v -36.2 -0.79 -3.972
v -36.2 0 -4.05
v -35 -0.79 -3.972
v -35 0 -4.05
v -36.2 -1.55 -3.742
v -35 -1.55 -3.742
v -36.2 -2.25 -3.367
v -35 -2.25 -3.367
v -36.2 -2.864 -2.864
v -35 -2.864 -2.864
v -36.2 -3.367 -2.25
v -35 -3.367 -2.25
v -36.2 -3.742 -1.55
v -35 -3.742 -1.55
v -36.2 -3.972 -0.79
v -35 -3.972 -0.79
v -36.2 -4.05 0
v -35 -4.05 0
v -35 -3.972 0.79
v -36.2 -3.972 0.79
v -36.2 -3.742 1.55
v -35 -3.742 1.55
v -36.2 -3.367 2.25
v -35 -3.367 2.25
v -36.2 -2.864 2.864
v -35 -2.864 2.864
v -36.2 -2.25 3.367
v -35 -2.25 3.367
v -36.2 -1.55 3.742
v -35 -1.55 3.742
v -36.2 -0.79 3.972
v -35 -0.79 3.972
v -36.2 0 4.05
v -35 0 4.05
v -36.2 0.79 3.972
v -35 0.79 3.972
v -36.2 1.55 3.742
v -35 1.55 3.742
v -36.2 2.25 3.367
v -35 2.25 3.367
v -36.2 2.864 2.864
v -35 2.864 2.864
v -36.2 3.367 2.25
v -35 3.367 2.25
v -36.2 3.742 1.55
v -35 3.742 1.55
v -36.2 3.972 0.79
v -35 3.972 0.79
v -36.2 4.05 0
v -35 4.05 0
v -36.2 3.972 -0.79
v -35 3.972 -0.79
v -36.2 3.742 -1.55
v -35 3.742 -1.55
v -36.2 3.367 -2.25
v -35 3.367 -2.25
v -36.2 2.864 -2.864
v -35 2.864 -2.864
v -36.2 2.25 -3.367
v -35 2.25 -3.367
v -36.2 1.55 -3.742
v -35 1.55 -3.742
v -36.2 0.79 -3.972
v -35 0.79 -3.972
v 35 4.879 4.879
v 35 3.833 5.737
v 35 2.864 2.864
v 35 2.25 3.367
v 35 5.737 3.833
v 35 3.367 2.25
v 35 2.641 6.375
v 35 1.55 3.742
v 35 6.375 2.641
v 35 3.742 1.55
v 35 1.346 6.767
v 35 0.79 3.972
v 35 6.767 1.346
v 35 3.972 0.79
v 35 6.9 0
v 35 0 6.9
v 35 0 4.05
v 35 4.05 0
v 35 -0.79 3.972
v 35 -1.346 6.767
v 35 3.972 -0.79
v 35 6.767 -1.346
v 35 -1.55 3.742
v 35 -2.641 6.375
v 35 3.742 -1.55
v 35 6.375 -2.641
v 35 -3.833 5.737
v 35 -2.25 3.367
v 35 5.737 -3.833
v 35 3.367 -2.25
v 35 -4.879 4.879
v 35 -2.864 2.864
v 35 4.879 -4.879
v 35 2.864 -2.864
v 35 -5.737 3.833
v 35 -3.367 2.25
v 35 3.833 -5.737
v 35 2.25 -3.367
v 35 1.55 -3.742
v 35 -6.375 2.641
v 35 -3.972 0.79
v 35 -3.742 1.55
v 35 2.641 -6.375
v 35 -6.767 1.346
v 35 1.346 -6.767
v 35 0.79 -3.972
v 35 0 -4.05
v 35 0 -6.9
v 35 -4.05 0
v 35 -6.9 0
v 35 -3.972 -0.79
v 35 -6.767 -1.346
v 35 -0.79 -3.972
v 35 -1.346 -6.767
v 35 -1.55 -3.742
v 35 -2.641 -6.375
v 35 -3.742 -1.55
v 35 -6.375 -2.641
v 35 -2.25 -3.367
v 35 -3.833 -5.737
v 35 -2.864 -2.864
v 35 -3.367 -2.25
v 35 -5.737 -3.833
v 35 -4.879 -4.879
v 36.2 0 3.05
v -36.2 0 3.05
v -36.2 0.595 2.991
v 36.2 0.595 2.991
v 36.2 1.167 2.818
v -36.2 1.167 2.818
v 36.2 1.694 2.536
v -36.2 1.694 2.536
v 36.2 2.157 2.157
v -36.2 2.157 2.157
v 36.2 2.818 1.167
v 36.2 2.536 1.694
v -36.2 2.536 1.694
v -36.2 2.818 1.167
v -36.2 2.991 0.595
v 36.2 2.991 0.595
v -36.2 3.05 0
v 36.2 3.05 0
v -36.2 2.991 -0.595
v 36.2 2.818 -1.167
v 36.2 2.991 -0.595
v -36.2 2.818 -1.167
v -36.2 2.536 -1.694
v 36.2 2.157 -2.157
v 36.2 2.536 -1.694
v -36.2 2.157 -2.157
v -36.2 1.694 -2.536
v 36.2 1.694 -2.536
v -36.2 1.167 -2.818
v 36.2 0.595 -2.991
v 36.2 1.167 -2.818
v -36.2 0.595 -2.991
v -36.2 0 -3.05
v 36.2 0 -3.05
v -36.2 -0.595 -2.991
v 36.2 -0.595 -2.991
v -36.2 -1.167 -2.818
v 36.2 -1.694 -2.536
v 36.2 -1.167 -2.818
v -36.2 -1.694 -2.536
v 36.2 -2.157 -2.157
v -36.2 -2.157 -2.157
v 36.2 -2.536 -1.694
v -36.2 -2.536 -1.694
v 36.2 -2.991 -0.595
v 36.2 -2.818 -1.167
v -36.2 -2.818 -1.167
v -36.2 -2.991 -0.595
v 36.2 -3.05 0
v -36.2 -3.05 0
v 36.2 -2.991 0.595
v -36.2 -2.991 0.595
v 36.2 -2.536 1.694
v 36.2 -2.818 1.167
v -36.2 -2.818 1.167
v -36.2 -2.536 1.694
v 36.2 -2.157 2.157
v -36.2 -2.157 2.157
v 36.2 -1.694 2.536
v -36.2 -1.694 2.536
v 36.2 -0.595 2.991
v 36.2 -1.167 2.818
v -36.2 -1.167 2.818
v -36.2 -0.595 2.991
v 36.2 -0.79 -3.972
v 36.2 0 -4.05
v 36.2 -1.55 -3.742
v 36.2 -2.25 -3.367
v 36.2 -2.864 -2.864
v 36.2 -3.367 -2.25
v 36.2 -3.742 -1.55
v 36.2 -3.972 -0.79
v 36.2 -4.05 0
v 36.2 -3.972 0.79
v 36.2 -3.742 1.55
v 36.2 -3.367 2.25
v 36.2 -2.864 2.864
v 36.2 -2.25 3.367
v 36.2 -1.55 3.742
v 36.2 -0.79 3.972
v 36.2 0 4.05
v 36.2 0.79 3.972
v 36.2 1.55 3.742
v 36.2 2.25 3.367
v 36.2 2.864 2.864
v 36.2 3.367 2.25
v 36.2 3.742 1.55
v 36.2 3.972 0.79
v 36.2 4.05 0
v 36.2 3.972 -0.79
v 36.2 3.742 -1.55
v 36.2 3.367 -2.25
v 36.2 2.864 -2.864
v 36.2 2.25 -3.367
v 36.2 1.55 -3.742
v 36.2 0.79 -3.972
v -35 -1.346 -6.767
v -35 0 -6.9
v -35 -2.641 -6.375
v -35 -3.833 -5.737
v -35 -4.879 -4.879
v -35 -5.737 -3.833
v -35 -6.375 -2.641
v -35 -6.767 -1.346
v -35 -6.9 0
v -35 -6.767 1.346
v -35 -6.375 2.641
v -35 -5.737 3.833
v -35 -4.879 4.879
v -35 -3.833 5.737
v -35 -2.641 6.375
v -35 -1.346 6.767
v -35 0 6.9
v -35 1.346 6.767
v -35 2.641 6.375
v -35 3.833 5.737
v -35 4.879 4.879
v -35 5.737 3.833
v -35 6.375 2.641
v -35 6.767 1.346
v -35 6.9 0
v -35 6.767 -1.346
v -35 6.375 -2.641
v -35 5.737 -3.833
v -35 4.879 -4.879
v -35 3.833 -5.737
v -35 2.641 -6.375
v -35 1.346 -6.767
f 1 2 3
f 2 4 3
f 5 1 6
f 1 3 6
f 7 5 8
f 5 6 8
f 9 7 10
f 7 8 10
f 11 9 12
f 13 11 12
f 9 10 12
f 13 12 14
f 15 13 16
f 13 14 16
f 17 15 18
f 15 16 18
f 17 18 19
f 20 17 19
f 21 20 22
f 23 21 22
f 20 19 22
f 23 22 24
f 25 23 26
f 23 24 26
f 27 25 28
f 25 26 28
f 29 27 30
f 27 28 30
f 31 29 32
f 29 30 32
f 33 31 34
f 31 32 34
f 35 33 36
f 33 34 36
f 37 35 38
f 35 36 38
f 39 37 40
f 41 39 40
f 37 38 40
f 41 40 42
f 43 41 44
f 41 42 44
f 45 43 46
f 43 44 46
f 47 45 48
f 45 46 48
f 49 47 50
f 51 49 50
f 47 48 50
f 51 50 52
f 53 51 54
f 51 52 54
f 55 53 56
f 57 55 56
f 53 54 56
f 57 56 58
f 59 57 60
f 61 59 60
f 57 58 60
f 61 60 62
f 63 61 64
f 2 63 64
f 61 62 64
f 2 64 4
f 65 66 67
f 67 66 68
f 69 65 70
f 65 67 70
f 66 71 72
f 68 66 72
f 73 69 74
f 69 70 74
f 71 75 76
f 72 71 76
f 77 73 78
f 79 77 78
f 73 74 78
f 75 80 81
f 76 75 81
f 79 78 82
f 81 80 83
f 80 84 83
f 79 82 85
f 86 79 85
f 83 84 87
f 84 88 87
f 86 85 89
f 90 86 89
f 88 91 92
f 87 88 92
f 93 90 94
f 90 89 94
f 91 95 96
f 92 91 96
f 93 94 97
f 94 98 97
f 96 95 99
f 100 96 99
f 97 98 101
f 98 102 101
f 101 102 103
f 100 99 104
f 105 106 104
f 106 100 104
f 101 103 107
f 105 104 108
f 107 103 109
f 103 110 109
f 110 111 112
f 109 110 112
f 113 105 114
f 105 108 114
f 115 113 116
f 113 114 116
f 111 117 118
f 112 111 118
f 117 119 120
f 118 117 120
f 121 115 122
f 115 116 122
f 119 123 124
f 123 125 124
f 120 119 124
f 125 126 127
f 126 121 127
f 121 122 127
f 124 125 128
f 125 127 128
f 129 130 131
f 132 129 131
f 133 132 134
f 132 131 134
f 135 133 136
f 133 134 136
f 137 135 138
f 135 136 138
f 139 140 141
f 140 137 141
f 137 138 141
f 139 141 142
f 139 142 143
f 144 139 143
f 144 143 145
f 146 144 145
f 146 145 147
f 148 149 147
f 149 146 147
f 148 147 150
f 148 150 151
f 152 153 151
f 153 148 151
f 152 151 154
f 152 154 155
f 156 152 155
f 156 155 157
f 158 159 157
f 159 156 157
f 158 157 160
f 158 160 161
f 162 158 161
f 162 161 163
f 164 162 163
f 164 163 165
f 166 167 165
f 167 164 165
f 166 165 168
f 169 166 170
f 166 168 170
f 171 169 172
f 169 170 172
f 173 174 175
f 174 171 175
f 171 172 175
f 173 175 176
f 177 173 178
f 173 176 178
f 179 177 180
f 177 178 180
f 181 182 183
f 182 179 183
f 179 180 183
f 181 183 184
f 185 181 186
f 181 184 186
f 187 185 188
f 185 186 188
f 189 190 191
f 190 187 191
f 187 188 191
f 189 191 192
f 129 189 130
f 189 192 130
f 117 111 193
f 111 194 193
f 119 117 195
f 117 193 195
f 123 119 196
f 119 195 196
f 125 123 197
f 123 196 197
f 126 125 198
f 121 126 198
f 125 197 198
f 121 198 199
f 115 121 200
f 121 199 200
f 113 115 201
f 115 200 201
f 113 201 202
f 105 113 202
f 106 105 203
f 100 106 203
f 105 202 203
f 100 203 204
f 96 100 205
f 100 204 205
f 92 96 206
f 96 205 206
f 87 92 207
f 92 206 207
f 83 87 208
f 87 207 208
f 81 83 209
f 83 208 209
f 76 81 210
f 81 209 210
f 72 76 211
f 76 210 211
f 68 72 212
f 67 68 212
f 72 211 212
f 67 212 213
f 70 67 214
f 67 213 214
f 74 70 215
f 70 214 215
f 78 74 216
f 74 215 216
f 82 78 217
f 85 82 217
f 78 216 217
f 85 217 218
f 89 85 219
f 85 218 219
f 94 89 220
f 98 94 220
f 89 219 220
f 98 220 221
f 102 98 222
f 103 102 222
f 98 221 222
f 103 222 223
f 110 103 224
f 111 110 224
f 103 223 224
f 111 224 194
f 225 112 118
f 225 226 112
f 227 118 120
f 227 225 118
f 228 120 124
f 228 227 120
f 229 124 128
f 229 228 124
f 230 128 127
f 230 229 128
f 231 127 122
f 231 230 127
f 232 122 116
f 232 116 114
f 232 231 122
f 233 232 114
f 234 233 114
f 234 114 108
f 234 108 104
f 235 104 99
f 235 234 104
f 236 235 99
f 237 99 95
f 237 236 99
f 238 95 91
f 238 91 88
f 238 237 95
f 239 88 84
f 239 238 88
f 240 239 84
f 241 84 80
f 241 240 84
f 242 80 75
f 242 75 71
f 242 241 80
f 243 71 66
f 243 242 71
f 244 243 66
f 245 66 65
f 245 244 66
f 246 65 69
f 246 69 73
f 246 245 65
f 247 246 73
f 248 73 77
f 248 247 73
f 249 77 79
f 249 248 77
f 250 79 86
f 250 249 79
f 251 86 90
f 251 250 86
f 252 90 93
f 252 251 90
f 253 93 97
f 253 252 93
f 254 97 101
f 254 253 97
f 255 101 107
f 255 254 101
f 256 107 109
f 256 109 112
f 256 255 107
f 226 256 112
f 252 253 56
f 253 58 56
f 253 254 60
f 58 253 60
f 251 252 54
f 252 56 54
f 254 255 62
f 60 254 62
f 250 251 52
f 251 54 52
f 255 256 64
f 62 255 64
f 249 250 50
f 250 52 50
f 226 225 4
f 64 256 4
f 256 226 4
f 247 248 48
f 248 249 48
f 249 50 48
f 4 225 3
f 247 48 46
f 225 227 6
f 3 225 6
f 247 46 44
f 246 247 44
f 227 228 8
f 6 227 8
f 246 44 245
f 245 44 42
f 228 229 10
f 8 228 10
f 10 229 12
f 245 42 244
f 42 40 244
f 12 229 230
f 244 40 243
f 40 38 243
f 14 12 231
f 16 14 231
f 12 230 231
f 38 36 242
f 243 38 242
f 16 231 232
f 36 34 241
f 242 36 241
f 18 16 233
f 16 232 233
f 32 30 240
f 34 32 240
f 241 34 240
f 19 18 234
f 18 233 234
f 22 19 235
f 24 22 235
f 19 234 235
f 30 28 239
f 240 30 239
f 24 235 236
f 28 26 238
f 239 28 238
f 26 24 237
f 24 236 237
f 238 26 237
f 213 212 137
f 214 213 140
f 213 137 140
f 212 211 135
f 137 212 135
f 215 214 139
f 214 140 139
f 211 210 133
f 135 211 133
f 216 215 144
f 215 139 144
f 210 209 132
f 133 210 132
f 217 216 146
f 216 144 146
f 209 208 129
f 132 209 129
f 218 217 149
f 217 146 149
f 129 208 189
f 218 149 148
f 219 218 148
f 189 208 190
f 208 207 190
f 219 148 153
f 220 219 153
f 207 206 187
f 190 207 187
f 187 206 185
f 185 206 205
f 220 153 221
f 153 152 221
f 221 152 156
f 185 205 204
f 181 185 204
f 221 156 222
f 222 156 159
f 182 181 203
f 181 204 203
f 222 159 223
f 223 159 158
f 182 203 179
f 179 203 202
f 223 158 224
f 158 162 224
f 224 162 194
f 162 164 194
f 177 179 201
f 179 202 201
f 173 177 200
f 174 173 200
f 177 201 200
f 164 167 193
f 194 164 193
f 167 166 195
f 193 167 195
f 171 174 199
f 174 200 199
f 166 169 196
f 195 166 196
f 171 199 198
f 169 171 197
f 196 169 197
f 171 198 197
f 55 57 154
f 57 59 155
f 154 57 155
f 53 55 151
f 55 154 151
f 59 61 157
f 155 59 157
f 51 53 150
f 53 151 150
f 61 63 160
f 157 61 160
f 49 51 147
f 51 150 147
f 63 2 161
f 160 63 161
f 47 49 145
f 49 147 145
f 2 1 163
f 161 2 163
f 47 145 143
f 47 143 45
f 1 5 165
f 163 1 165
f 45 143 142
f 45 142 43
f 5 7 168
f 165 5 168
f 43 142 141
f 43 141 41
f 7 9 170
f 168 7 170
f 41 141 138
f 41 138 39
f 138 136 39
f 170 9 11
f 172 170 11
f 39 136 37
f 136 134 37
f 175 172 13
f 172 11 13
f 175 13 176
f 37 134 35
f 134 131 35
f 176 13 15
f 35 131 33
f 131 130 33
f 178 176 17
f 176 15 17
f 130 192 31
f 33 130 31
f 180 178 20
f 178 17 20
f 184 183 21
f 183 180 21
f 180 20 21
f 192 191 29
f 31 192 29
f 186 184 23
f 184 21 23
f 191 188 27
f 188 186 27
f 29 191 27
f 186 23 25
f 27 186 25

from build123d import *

# Parameters (mm, degrees)
CUT_EXTRUDE2_REACH = 59.435
SKETCH4_W          = 5
SKETCH4_H          = 5.1
FILLET1_R          = 0.5
SKETCH13_R         = 3.05
CUT_EXTRUDE3_DEPTH = 114.619804612


with BuildPart() as part:
    # Sketch2 → Revolve2 (revolve)
    with BuildSketch(Plane.XY):
        Polygon((-56.6, 0), (56.6, 0), (56.6, 2.55), (36.2, 2.55), (36.2, 4.05), (35, 4.05), (35, 6.9), (30, 6.9), (-30, 6.9), (-35, 6.9), (-35, 4.05), (-36.2, 4.05), (-36.2, 2.55), (-56.6, 2.55), align=None)
    revolve(axis=Axis((62.26, 0, 0), (-1, 0, 0)))

    # Sketch4 → Cut-Extrude2 (cut, up to next)
    with BuildSketch(Plane(origin=(0, 0, 0), x_dir=(1, 0, 0), z_dir=(0, 1, 0)), mode=Mode.PRIVATE) as cut_extrude2_sk1:
        with Locations((-54.1, 0)):
            Rectangle(SKETCH4_W, SKETCH4_H)
    cut_extrude2_tool1 = extrude(cut_extrude2_sk1.sketch, amount=CUT_EXTRUDE2_REACH, mode=Mode.PRIVATE) & part.part
    add(cut_extrude2_tool1.solids().sort_by_distance((-54.1, 0, 0))[0], mode=Mode.SUBTRACT)

    # Fillet1
    fillet1_edges = [part.edges().sort_by_distance(p)[0] for p in [
        (36.2, -2.55, 0),
        (-36.2, -2.55, 0),
    ]]
    fillet(fillet1_edges, radius=FILLET1_R)

    # Sketch13 → Cut-Extrude3 (cut, through all)
    with BuildSketch(Plane.ZY.offset(56.6)):
        Circle(SKETCH13_R)
    extrude(amount=-CUT_EXTRUDE3_DEPTH, mode=Mode.SUBTRACT)


solid = part.part
